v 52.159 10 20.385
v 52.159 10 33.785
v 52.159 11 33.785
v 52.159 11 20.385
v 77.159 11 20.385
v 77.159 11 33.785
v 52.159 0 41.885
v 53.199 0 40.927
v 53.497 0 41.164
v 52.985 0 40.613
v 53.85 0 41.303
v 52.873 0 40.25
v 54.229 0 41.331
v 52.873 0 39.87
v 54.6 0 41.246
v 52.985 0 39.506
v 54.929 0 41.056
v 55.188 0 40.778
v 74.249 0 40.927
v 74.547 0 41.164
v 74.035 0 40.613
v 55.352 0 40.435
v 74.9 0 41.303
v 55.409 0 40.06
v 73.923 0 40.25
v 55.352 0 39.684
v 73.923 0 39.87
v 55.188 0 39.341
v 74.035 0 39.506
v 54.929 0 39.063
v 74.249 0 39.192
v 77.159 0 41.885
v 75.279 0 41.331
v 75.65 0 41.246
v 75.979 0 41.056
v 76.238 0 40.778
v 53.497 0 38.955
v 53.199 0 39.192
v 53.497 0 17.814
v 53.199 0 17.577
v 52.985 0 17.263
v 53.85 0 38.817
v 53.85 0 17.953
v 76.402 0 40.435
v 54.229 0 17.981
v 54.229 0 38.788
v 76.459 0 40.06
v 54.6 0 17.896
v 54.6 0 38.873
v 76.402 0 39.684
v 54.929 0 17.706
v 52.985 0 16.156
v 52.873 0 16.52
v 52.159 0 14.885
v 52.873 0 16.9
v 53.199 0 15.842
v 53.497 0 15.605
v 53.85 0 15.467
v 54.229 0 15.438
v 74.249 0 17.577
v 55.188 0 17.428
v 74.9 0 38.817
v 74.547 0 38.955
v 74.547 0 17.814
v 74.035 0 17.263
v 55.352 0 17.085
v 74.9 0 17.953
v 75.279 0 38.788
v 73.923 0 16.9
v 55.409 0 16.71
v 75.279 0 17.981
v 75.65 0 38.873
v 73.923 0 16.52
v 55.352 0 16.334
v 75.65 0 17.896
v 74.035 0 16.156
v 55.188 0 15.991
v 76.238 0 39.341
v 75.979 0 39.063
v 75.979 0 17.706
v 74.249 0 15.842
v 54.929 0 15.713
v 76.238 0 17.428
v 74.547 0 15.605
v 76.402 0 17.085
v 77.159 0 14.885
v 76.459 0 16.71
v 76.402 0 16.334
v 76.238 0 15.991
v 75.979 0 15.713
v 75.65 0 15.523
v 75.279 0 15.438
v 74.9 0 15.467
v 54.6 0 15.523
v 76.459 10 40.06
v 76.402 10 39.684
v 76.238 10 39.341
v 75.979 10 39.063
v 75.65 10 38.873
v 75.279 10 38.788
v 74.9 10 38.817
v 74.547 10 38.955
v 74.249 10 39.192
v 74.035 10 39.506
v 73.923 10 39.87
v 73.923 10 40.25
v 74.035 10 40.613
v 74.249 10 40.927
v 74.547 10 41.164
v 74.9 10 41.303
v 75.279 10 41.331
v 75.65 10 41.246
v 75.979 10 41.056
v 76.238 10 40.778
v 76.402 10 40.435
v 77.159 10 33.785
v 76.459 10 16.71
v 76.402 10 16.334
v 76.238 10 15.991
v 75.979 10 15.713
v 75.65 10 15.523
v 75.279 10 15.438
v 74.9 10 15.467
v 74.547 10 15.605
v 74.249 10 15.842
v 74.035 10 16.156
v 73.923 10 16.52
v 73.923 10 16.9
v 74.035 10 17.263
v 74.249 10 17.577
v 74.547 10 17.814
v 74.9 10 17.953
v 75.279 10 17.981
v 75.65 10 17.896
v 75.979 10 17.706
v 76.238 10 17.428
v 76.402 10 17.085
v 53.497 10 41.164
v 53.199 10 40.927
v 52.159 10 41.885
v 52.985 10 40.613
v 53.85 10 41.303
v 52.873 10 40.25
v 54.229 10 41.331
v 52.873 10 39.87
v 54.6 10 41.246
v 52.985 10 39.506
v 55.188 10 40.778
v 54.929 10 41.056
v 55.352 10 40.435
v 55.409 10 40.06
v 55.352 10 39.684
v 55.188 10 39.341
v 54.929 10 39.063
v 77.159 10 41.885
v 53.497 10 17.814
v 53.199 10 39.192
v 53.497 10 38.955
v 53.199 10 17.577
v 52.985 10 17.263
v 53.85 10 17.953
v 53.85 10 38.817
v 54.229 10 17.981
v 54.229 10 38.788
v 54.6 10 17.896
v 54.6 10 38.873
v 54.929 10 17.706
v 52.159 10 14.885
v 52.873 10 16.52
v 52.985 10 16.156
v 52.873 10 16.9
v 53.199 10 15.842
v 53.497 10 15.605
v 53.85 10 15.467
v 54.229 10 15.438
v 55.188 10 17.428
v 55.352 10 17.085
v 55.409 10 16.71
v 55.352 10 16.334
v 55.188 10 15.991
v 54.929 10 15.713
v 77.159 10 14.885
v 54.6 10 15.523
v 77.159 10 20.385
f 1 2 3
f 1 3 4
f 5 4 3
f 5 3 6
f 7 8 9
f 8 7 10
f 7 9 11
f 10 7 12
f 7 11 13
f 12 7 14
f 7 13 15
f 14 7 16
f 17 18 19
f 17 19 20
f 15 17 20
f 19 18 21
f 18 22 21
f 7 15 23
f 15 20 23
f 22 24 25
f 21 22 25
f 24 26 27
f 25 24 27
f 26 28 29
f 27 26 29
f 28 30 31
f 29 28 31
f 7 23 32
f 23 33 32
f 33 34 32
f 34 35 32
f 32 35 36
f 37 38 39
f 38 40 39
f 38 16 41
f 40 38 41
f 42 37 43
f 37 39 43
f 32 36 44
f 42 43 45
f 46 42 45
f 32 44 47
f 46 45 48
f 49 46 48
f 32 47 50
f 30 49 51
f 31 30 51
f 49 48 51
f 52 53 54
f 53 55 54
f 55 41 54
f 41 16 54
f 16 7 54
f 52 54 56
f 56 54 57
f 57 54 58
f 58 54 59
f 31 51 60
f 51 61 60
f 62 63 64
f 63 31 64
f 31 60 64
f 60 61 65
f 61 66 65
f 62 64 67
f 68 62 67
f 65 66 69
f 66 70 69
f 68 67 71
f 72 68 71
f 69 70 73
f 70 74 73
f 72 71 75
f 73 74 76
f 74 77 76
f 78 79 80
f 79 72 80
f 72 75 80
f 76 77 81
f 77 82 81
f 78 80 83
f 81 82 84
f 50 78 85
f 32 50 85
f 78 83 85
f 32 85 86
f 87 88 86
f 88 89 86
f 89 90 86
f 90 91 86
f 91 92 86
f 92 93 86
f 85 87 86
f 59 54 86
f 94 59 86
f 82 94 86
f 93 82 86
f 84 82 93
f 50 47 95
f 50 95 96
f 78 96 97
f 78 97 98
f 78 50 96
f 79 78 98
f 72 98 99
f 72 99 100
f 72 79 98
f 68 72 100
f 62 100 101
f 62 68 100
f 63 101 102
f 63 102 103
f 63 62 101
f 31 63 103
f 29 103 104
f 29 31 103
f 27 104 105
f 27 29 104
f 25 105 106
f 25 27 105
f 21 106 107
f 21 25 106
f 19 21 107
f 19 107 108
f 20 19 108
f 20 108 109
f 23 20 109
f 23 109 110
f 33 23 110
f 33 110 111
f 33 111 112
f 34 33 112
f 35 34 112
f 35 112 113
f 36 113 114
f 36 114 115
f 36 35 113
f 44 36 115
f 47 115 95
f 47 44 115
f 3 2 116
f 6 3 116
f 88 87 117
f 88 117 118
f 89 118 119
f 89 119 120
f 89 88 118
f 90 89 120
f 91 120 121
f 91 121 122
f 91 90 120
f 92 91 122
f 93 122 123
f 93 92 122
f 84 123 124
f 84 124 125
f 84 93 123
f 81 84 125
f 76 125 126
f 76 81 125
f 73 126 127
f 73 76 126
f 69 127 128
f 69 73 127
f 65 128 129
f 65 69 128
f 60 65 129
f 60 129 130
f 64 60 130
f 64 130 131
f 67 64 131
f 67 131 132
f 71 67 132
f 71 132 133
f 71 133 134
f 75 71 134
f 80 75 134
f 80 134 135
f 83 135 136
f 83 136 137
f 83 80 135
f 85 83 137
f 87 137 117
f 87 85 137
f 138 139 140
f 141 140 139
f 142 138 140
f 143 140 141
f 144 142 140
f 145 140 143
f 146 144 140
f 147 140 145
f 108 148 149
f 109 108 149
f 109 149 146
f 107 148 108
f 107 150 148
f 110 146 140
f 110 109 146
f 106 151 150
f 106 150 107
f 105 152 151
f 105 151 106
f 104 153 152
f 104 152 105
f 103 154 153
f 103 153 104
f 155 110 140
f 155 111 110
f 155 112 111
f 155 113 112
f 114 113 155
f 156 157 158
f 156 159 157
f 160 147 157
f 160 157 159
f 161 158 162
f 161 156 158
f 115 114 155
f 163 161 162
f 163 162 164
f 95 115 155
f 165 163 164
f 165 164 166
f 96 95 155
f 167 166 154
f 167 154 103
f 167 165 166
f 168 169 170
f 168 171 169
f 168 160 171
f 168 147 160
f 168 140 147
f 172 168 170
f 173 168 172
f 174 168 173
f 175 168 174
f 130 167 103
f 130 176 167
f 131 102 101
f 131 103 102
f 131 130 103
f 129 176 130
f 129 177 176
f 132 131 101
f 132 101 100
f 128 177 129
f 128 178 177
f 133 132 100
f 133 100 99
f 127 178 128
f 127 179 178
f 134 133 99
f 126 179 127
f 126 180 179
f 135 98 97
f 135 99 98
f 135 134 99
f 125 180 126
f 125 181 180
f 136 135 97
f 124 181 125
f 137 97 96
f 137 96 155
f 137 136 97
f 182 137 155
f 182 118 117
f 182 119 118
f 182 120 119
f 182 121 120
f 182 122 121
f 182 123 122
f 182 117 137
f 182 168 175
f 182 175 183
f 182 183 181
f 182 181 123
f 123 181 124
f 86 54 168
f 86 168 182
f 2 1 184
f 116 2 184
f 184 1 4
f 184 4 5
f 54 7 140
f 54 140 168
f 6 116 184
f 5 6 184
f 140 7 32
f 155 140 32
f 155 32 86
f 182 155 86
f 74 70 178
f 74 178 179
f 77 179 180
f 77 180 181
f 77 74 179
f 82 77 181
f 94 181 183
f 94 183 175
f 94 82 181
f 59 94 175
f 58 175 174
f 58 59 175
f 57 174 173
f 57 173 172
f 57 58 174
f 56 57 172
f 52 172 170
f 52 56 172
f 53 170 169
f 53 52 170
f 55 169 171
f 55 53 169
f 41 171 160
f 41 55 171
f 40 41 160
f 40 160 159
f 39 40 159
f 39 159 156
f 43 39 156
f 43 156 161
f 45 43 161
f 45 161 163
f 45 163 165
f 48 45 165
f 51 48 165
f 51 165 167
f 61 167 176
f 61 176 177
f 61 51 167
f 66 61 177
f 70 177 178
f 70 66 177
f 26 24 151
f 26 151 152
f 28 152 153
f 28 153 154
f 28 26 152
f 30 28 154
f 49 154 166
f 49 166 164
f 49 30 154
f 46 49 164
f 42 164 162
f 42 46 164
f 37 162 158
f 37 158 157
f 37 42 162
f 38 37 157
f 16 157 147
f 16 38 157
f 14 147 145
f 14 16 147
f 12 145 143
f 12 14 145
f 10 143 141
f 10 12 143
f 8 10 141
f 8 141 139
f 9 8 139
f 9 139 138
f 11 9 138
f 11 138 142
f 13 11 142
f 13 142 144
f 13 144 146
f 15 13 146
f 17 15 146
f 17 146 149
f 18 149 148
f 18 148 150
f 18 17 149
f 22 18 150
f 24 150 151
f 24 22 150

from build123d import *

# Parameters (mm, degrees)
SKETCH1_W           = 25
SKETCH1_H           = 27
SKETCH1_R           = 1.275
BOSS_EXTRUDE1_DEPTH = 10
SKETCH2_W           = 25
SKETCH2_H           = 13.4
BOSS_EXTRUDE2_DEPTH = 1


with BuildPart() as part:
    # Sketch1 → Boss-Extrude1 (new body)
    with BuildSketch(Plane(origin=(0, 0, 0), x_dir=(1, 0, 0), z_dir=(0, 1, 0))):
        with Locations((64.659126964, -28.384601034)):
            Rectangle(SKETCH1_W, SKETCH1_H)
        with Locations((54.134126964, -16.709601034)):
            Circle(SKETCH1_R, mode=Mode.SUBTRACT)
        with Locations((54.134126964, -40.059601034)):
            Circle(SKETCH1_R, mode=Mode.SUBTRACT)
        with Locations((75.184126964, -40.059601034)):
            Circle(SKETCH1_R, mode=Mode.SUBTRACT)
        with Locations((75.184126964, -16.709601034)):
            Circle(SKETCH1_R, mode=Mode.SUBTRACT)
    extrude(amount=BOSS_EXTRUDE1_DEPTH)


with BuildPart() as body_2:
    # Sketch2 → Boss-Extrude2 (new body)
    with BuildSketch(Plane(origin=(0, 10, 0), x_dir=(1, 0, 0), z_dir=(0, 1, 0))):
        with Locations((64.659126964, -27.084601034)):
            Rectangle(SKETCH2_W, SKETCH2_H)
    extrude(amount=BOSS_EXTRUDE2_DEPTH)


solid = Compound([part.part, body_2.part])
